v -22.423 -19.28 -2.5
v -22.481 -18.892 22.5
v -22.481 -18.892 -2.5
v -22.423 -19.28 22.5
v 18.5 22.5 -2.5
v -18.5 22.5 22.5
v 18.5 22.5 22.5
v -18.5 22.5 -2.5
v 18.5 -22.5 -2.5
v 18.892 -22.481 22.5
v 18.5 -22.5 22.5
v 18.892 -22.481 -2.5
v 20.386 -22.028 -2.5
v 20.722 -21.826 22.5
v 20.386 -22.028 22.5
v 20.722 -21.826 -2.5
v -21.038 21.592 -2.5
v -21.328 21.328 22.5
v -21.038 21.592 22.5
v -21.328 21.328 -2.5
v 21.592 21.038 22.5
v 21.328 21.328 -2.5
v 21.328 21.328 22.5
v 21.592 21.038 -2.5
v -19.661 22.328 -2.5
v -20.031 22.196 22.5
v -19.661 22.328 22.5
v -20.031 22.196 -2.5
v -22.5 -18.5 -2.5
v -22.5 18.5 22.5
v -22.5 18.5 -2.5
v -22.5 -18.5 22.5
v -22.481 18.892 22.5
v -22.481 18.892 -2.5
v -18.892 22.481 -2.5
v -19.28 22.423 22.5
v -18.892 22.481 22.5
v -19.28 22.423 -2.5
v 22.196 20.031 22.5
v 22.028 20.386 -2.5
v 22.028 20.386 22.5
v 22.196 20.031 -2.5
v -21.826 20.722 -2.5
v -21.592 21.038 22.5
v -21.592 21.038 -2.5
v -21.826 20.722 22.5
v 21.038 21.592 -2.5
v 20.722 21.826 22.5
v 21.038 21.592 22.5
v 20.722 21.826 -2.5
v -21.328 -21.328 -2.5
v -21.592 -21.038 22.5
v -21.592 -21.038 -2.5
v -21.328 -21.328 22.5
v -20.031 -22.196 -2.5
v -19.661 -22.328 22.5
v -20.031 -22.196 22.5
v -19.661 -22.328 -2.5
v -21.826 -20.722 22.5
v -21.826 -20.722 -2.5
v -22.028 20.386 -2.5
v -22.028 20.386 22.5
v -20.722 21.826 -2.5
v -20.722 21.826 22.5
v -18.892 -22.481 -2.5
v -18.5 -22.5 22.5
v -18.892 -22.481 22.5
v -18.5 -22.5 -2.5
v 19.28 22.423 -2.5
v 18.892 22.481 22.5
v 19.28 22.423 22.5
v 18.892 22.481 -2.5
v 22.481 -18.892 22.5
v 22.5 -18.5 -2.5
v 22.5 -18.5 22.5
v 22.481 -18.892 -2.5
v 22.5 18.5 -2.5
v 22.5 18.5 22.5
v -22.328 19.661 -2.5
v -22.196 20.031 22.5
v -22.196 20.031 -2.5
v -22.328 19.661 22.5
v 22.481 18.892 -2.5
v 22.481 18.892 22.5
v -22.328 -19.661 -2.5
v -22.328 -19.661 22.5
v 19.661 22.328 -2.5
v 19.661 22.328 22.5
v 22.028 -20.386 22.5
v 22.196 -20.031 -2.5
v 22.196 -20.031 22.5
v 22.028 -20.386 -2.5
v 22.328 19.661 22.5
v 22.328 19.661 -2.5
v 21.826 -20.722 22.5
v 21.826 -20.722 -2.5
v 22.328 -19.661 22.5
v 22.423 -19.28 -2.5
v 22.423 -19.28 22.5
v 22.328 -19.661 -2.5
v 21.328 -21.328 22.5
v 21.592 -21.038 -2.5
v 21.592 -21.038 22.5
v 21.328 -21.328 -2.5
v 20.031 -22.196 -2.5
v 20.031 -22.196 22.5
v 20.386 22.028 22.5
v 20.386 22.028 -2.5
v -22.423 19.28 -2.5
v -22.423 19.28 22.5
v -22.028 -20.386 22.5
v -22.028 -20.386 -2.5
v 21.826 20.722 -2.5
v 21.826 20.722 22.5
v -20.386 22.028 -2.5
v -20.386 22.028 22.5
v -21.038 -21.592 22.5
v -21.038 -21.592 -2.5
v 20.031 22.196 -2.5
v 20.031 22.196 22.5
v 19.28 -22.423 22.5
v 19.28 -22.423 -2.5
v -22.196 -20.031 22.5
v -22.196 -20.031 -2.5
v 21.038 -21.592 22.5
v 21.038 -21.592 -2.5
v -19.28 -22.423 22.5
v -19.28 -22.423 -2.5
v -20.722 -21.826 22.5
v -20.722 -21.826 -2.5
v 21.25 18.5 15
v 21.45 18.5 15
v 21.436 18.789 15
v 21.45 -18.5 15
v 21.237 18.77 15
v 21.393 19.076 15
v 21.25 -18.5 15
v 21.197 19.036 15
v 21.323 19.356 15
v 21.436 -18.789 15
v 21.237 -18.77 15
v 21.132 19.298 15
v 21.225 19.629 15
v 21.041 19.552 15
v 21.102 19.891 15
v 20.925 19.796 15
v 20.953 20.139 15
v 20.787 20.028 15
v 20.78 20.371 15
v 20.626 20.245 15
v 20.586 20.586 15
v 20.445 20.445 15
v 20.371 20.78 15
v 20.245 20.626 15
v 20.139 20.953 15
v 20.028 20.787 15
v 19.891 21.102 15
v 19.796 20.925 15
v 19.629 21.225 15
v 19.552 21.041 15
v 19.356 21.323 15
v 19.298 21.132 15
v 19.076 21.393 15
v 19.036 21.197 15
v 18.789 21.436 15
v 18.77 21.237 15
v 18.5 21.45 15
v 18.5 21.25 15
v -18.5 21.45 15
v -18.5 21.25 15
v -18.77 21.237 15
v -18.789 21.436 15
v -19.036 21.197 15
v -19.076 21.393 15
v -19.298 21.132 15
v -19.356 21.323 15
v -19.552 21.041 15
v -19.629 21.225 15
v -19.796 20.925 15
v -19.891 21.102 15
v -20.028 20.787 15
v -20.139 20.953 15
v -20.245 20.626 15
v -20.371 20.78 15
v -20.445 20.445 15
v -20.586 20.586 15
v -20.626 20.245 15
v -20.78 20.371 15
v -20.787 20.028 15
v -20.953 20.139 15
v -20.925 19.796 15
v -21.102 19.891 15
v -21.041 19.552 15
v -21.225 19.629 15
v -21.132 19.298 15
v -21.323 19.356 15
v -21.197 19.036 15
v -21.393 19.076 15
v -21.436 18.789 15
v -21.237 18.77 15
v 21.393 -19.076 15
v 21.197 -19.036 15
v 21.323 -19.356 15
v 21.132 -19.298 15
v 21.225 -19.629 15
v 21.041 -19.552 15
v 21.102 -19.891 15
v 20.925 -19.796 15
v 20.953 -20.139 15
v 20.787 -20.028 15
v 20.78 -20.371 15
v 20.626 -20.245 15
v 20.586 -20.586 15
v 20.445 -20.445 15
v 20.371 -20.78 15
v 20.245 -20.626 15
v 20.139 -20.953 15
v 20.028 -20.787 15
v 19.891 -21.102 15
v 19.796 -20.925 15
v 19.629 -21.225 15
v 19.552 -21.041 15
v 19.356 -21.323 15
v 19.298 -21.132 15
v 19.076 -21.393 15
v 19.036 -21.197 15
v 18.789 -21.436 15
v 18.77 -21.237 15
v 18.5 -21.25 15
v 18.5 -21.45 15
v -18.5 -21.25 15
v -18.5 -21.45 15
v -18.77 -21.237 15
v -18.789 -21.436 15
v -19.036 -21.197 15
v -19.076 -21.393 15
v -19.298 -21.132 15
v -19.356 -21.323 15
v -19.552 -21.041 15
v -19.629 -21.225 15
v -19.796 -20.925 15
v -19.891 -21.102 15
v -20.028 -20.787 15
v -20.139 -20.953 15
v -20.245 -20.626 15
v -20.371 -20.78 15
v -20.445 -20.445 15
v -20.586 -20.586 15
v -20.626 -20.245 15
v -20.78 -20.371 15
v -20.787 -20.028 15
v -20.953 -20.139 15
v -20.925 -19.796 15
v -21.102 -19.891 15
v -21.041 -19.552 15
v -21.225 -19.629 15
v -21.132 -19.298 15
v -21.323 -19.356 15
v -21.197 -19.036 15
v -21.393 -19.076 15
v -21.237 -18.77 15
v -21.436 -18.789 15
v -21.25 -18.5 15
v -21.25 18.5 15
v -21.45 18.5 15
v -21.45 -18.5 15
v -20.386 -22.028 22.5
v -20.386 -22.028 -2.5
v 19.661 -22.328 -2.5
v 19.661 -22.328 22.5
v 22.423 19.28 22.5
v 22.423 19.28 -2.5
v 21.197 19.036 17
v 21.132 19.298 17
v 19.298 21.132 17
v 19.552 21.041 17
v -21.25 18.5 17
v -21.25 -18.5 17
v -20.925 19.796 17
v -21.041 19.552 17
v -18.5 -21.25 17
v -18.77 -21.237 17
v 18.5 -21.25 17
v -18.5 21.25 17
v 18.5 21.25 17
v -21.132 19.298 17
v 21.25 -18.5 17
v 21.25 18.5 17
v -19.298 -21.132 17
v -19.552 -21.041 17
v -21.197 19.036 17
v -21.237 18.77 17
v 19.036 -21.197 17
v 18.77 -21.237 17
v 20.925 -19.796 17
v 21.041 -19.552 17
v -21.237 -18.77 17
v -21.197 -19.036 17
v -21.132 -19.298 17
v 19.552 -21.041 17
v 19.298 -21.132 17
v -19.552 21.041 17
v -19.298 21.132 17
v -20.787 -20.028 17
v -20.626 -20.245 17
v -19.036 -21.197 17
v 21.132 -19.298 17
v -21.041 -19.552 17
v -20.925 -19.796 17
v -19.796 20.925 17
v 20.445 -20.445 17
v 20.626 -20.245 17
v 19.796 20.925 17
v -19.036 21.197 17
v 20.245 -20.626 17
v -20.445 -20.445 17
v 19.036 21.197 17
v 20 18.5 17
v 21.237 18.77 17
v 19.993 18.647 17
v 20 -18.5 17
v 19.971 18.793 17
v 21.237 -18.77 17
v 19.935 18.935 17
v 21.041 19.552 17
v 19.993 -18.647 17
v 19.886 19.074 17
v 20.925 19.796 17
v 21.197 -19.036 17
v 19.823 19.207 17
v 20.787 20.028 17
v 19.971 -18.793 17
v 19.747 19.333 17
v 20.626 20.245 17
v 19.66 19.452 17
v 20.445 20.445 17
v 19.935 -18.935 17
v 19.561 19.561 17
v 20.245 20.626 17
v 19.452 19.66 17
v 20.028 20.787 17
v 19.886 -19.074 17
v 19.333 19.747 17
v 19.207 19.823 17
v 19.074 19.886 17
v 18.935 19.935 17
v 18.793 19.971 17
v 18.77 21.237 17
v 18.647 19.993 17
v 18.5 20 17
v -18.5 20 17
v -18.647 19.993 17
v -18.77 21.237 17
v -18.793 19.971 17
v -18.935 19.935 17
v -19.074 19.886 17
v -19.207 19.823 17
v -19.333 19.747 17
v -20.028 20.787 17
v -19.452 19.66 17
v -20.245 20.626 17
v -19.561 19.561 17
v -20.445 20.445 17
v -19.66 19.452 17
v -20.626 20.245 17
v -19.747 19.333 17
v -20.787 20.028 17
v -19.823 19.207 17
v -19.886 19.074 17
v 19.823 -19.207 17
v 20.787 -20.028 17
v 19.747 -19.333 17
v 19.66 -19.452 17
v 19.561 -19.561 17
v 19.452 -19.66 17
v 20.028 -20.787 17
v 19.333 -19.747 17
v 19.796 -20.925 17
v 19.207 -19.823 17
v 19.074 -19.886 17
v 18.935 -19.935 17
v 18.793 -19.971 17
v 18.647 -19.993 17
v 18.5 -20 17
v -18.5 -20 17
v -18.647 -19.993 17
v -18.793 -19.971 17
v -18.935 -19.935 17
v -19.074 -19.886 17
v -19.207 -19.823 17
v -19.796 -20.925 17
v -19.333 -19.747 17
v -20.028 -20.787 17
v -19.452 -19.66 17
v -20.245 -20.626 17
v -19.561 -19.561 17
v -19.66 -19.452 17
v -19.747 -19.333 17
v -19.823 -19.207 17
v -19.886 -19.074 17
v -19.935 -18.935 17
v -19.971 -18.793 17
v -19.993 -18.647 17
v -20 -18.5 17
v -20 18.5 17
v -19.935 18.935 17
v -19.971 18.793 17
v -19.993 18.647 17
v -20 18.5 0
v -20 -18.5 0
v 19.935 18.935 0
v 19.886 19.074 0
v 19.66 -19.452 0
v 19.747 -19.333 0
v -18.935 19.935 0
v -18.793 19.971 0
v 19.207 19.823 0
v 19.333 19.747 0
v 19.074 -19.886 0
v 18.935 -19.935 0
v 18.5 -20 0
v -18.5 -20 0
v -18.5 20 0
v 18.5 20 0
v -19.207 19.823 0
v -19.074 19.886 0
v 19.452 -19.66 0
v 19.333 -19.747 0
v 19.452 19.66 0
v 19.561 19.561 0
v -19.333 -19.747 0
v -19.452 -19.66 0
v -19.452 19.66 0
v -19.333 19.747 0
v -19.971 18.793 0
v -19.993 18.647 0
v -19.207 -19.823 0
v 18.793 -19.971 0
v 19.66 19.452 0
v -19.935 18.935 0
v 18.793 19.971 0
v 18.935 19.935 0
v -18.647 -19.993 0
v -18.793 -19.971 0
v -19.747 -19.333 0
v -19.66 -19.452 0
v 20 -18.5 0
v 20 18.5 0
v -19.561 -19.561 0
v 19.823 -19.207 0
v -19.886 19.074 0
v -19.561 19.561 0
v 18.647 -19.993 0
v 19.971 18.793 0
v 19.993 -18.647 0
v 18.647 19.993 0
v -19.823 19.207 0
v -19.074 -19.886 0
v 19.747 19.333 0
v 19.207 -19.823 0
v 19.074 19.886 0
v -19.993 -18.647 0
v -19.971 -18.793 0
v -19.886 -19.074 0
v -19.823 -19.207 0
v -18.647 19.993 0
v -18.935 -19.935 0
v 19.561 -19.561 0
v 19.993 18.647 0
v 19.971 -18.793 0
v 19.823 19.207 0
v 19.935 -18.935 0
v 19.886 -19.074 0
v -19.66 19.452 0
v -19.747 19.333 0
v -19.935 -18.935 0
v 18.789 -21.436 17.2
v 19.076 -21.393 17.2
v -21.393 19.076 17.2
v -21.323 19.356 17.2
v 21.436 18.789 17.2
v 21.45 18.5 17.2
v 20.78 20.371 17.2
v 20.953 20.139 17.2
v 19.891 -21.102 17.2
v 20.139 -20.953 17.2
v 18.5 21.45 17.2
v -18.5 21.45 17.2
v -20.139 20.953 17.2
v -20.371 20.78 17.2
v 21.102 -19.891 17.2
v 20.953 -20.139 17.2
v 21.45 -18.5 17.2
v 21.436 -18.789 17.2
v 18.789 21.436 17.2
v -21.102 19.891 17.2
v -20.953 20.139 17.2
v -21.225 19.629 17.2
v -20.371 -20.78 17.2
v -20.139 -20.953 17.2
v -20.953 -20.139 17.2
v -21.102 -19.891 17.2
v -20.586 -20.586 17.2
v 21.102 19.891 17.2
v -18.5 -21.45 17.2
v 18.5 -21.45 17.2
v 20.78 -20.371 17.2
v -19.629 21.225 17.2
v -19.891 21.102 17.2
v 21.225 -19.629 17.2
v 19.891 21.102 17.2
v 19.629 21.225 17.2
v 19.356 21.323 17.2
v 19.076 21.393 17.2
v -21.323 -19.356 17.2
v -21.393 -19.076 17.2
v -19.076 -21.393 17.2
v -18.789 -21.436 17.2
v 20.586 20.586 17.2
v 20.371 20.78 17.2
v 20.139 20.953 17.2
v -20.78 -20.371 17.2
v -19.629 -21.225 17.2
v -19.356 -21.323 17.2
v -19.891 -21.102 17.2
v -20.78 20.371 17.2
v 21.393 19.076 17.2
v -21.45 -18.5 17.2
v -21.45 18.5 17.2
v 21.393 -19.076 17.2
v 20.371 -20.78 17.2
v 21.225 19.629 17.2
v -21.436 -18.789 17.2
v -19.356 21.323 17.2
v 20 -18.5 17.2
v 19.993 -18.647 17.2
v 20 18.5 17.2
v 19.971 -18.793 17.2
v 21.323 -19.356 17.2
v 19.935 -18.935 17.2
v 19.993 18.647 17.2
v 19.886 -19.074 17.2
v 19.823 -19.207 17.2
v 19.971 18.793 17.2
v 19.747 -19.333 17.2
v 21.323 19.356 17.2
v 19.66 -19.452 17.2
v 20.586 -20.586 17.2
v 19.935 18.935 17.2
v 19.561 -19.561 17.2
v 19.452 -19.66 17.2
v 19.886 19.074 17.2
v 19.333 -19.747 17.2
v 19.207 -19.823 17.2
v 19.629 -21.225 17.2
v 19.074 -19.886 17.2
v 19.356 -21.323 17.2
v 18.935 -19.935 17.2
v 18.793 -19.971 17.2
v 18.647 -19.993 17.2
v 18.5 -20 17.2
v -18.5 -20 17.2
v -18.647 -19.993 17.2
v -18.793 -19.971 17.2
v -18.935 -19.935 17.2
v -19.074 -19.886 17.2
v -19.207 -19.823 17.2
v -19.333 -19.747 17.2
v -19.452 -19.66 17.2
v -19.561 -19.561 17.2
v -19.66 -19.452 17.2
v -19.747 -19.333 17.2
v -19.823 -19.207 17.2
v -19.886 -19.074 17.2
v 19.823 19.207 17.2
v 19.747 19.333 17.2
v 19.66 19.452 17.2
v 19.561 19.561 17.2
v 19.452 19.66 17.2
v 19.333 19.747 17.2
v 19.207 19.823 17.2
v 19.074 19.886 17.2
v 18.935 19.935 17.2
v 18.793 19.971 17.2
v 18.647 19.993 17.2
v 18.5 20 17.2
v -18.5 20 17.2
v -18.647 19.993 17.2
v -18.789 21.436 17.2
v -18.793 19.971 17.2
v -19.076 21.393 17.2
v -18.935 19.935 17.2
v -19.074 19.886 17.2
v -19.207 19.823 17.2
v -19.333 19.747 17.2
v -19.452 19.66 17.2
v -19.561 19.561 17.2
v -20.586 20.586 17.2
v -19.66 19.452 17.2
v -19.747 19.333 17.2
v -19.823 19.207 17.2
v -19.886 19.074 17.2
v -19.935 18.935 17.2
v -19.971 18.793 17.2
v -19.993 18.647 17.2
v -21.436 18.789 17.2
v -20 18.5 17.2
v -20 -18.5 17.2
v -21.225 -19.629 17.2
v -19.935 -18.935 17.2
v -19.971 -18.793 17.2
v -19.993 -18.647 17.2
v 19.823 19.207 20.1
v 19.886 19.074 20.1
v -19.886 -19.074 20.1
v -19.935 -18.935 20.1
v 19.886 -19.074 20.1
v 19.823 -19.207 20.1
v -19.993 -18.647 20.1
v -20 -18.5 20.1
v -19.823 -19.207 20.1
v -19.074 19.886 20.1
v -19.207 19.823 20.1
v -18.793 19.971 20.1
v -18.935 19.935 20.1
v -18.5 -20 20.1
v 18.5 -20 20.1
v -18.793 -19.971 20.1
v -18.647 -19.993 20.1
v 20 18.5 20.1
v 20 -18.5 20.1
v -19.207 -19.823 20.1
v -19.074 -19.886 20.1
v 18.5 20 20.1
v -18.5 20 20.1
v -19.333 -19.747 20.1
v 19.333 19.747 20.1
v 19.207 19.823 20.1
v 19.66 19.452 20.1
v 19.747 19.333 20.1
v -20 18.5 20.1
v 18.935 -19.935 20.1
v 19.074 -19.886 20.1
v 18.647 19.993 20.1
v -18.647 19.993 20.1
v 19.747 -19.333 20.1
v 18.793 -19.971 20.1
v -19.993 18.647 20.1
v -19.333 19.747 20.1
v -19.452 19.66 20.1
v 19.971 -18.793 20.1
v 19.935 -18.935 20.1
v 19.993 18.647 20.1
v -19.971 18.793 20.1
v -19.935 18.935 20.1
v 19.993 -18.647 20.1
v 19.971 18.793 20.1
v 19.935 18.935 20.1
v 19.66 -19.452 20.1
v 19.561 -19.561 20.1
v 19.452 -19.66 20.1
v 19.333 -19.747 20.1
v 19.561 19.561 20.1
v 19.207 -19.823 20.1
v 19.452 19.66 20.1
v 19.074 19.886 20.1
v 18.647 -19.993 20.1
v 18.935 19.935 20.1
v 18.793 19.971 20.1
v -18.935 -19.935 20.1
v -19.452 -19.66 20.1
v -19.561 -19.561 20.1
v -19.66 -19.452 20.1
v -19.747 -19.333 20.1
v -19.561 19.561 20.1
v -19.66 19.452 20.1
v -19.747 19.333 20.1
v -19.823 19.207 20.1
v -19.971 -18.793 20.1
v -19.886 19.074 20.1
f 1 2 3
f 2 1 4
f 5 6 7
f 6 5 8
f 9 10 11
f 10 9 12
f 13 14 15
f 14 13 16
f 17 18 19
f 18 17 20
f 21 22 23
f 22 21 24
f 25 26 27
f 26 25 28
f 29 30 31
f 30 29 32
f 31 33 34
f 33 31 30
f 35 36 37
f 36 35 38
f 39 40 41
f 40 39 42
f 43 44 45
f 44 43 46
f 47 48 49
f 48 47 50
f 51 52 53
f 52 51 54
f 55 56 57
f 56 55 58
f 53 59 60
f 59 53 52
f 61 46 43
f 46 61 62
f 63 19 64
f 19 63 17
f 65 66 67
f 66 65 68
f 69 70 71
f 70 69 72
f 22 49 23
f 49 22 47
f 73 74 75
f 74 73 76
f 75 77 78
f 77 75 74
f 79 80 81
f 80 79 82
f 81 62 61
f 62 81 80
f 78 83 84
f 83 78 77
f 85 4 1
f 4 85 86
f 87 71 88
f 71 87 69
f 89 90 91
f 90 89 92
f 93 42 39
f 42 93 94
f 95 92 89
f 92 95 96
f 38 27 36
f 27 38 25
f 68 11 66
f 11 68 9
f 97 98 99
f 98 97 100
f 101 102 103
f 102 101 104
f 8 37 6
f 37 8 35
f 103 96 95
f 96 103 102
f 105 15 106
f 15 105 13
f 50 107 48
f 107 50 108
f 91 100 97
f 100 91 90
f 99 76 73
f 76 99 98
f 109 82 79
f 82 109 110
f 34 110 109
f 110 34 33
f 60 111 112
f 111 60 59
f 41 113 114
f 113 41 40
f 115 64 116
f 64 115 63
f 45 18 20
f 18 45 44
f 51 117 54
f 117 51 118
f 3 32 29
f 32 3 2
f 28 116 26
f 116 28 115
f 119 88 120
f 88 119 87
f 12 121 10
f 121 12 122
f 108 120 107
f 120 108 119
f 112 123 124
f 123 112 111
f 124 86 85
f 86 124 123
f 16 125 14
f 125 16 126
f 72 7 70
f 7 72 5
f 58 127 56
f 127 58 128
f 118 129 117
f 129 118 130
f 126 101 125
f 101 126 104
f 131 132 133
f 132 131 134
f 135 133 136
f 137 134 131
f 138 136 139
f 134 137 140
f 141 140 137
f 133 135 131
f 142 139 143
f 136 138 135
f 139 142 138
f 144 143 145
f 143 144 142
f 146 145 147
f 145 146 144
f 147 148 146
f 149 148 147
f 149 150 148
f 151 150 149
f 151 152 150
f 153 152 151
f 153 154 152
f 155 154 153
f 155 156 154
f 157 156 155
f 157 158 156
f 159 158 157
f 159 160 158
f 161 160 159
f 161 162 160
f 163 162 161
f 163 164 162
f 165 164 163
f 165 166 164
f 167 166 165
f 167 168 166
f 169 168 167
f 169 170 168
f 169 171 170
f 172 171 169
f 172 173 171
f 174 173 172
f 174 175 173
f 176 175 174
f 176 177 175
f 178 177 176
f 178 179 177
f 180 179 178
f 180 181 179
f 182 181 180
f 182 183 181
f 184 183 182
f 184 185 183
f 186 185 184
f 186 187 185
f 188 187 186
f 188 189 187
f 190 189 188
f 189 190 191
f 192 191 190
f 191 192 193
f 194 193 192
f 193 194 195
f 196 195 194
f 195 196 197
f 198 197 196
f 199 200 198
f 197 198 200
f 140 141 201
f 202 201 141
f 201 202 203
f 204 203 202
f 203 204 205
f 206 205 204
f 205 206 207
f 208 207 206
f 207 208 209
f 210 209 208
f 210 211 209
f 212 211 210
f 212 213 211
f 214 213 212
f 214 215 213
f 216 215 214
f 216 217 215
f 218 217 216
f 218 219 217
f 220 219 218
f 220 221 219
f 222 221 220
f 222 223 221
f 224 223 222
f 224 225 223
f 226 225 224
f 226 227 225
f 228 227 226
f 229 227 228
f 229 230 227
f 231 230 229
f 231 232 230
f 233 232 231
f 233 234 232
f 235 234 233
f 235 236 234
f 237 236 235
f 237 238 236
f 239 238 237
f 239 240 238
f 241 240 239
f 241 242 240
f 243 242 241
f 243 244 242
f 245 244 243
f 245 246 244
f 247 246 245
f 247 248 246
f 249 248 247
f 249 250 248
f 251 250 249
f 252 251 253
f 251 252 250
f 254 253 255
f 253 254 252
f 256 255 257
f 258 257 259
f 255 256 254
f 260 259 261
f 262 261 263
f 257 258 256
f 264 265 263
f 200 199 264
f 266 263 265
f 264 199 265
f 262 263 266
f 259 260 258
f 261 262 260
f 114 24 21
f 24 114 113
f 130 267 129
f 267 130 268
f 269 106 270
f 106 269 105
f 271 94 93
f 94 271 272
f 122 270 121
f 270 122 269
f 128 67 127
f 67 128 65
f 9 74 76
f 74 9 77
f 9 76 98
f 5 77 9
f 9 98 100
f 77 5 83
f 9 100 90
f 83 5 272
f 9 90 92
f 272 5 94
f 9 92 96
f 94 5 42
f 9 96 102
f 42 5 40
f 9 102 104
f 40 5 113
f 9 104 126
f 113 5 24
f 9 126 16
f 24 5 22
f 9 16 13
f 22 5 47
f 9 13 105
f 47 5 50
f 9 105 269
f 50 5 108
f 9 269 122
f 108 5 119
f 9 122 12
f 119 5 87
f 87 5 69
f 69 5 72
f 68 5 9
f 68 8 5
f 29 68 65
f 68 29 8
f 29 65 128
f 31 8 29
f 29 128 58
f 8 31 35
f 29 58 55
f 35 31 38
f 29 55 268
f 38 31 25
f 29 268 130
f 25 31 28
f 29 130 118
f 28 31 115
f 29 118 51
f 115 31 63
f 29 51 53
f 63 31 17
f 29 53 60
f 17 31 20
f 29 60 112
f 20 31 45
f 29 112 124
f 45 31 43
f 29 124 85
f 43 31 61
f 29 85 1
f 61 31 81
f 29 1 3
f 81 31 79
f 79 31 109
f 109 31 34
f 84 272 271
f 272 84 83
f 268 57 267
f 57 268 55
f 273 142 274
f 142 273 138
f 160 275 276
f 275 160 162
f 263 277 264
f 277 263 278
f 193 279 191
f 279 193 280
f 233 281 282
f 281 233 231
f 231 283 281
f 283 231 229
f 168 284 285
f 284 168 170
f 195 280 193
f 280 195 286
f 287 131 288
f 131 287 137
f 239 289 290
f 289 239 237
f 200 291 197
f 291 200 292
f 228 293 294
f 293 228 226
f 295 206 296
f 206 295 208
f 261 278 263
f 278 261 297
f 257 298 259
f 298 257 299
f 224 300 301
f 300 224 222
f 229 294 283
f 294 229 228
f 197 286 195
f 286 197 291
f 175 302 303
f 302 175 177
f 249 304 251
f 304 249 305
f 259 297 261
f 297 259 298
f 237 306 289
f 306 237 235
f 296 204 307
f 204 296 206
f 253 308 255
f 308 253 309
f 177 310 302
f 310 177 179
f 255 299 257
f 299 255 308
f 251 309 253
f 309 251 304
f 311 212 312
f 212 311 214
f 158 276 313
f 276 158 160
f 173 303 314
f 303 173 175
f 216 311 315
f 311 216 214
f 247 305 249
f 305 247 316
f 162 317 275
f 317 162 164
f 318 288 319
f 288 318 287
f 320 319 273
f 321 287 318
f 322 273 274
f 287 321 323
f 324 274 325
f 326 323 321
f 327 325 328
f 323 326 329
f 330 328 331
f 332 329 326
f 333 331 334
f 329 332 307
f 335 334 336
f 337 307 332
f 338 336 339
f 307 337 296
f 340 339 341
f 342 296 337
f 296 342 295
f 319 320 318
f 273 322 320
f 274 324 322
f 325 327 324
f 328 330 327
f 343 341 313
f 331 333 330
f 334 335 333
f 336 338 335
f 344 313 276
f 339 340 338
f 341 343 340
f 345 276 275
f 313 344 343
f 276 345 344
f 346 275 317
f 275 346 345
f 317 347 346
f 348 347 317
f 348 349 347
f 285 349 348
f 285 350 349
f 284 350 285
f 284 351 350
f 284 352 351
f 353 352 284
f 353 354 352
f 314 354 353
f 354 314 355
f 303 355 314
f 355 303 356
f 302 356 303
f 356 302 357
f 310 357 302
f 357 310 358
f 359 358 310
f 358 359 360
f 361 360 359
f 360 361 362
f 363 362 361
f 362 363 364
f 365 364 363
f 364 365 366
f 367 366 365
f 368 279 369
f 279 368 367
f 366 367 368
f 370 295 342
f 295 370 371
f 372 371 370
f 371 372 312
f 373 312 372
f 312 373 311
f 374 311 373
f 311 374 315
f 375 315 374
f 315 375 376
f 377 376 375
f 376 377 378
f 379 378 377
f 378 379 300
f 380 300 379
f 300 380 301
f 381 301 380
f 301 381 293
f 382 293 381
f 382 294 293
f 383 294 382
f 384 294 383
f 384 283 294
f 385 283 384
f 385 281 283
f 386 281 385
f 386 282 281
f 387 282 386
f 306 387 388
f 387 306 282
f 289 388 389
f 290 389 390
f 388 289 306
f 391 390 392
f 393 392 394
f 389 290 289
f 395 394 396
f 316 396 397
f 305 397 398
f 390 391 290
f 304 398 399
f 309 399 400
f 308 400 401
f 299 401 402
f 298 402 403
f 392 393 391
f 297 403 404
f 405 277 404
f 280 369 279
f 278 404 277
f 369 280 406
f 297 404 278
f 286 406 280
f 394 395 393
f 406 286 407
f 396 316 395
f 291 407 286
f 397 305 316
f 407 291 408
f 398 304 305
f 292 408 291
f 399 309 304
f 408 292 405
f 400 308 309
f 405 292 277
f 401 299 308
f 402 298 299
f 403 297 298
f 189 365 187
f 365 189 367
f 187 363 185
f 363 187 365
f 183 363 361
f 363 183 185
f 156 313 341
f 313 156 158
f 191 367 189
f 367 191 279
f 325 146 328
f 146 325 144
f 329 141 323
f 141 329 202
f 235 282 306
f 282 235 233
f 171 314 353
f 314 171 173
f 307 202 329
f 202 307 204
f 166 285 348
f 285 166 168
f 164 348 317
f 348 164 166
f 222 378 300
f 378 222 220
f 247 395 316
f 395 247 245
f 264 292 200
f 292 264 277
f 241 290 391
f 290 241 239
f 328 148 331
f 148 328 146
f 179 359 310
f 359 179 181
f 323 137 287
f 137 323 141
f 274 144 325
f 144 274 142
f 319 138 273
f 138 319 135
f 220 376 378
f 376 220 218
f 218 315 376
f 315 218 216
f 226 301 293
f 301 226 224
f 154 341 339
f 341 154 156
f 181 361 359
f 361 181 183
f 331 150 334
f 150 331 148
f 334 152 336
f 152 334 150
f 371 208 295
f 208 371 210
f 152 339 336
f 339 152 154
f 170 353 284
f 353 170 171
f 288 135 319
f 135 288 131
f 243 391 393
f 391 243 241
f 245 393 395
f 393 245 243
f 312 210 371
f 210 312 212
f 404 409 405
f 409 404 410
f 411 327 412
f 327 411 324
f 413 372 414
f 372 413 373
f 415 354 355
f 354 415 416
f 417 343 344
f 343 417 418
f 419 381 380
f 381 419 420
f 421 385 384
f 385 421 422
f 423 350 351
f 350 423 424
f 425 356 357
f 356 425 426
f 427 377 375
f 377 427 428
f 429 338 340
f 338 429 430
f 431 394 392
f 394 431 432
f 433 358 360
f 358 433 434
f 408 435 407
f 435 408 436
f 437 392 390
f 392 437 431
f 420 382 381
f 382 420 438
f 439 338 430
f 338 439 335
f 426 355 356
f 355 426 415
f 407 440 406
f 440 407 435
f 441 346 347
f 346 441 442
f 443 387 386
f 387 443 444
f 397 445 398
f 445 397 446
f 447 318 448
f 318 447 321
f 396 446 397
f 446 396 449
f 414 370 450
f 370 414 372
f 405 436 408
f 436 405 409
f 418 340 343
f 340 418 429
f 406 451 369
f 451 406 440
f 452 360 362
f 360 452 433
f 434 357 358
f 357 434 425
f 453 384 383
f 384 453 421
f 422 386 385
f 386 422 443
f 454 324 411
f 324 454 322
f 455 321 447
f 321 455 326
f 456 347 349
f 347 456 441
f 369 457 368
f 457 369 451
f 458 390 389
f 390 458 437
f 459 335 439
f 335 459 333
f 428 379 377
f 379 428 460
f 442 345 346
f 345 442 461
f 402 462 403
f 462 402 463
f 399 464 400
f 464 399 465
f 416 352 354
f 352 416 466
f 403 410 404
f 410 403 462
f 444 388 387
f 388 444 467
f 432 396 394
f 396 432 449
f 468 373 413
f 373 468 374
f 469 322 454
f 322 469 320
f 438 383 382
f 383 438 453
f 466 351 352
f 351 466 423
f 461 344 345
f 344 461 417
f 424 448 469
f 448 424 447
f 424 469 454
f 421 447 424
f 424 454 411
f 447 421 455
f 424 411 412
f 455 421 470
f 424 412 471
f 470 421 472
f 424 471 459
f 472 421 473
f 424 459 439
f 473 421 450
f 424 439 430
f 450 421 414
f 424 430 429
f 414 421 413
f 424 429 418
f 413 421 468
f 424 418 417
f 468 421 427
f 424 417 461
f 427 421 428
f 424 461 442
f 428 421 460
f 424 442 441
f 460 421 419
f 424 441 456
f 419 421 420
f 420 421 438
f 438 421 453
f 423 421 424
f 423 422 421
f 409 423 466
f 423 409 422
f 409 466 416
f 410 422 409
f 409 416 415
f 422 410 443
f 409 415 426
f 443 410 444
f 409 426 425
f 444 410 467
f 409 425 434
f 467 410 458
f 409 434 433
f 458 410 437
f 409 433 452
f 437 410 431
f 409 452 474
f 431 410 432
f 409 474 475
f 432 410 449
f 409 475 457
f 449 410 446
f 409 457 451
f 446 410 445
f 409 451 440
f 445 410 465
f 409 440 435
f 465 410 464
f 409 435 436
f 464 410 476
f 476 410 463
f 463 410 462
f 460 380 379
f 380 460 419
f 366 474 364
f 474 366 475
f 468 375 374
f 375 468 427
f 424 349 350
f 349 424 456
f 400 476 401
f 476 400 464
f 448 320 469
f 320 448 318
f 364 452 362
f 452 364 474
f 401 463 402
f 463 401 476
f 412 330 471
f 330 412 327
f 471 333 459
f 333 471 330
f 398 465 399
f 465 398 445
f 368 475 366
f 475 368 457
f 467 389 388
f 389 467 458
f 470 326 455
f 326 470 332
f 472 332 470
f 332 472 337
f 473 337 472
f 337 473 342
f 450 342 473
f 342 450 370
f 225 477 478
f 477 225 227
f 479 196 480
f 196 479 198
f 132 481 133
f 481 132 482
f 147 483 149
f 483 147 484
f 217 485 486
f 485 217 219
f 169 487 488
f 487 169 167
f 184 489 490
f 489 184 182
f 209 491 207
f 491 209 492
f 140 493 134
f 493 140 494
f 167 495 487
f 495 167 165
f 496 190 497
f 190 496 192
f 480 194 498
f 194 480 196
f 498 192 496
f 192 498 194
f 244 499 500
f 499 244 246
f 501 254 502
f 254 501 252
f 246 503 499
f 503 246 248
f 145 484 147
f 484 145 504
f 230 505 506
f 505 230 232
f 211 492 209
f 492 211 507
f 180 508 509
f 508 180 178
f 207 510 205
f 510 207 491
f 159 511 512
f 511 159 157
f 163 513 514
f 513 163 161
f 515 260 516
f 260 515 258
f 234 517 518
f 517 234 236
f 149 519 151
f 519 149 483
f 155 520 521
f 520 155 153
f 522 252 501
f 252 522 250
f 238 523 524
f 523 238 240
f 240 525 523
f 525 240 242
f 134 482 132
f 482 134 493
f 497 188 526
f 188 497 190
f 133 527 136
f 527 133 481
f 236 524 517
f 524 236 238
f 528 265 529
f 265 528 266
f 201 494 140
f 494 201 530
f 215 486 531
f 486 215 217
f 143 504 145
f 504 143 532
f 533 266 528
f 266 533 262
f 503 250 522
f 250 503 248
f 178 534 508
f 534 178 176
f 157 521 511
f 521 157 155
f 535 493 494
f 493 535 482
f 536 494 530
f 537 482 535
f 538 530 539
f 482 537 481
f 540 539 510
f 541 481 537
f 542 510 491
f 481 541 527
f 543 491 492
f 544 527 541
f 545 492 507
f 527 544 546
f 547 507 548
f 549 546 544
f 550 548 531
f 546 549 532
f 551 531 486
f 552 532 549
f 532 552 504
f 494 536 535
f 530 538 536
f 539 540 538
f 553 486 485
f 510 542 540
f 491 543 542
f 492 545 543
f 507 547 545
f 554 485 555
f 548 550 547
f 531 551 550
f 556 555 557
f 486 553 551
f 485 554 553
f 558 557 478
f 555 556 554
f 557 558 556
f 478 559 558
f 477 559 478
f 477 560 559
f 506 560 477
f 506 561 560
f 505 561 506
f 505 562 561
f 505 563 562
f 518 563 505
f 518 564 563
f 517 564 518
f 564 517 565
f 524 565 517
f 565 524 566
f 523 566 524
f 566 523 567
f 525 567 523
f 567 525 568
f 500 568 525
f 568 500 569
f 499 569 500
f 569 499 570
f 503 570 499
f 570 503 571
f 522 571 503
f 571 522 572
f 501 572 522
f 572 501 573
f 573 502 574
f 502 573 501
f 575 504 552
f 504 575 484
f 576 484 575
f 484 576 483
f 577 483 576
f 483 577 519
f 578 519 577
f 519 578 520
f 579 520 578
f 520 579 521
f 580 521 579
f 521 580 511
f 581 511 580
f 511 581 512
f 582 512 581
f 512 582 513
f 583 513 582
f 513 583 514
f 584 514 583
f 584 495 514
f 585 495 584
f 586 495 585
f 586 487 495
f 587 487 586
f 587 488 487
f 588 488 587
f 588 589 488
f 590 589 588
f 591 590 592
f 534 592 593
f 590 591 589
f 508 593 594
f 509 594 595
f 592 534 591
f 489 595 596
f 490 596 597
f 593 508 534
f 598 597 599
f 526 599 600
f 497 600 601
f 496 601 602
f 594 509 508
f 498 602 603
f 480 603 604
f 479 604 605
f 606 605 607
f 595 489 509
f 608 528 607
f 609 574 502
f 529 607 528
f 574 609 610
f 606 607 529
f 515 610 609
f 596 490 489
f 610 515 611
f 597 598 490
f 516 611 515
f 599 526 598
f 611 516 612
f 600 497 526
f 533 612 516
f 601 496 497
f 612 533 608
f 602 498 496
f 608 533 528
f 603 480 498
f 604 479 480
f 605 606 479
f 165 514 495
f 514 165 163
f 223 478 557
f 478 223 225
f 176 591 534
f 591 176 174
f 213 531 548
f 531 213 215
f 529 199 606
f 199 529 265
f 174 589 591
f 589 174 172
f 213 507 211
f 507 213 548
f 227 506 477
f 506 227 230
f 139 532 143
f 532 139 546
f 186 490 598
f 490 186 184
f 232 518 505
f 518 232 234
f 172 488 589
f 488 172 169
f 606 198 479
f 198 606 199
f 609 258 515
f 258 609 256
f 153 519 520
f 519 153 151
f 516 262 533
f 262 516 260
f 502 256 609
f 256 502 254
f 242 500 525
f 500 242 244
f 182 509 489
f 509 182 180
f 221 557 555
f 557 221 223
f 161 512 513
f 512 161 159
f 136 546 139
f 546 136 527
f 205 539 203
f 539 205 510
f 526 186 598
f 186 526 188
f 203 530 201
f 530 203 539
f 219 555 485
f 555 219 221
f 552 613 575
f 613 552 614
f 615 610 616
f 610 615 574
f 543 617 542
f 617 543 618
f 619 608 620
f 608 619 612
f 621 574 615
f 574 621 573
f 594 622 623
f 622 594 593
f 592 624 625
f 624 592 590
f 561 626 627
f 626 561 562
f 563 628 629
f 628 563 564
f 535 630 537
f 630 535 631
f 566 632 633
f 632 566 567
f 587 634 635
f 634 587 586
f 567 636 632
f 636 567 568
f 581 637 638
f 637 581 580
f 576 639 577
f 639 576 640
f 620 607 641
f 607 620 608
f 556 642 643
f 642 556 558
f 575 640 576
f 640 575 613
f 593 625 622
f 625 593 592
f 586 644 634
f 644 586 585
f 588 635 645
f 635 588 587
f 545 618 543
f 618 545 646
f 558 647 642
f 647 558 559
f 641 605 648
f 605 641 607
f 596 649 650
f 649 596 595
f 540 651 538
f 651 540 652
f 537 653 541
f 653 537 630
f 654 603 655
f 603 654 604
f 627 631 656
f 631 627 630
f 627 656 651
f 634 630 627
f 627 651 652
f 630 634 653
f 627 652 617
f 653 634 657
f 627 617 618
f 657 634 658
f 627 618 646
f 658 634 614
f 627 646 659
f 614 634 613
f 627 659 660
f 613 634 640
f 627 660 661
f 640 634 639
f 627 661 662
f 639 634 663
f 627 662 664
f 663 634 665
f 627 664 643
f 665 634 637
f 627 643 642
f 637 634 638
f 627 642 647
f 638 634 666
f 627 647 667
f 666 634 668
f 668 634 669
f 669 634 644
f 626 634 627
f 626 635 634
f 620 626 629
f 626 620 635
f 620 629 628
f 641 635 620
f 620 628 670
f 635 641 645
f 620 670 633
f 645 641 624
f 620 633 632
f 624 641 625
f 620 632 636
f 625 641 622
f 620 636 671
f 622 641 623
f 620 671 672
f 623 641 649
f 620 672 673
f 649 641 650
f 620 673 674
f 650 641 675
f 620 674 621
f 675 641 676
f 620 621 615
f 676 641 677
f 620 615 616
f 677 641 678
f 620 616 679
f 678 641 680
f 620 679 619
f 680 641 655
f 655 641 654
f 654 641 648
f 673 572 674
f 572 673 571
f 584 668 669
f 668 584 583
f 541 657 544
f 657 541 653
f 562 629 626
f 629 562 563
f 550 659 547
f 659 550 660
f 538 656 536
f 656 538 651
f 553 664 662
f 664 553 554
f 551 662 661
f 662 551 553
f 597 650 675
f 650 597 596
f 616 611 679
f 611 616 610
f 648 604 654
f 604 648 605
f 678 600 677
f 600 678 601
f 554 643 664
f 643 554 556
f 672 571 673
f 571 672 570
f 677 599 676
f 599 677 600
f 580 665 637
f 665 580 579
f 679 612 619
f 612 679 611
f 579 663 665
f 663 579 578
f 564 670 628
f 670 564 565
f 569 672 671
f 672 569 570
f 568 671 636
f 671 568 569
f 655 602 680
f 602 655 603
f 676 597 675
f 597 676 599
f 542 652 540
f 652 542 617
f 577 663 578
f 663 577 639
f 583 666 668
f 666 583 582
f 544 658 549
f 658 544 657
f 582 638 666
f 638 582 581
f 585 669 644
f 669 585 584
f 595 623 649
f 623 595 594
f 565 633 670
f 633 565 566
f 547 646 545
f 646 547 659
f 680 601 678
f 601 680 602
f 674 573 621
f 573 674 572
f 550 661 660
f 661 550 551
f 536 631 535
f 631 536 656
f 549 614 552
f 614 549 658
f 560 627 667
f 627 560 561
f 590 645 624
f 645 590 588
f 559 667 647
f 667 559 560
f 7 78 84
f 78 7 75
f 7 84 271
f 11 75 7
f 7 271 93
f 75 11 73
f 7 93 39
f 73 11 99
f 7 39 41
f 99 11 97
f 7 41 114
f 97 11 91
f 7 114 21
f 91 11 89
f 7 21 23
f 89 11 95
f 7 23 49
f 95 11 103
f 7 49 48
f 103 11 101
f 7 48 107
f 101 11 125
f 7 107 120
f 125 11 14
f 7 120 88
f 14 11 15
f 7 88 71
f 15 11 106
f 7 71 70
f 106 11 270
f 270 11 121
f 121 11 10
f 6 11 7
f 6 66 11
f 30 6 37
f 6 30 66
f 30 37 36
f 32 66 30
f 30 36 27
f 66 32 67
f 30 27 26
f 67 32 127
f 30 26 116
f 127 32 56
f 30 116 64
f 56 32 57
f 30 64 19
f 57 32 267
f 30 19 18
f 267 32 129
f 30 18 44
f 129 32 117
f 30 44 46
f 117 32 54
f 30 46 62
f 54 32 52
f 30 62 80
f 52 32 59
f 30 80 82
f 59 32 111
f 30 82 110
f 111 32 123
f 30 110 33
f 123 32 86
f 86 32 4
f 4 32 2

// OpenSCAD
// Parameters
cavity_width = 40.0;
cavity_length = 40.0;
cavity_height_base = 15.0;
cavity_height_lid = 5.0;
wall_thickness = 2.5;
lip_height = 2.0;
clearance = 0.2; // 3D printing clearance

// Radii calculations for rounded corners to maintain uniform wall thickness
r_outer = 4.0;
r_inner = r_outer - wall_thickness; // 1.5
lip_width = wall_thickness / 2;     // 1.25
r_lip_outer = r_outer - lip_width;  // 2.75
r_pocket = r_lip_outer + clearance; // 2.95

// Derived dimensions
outer_width = cavity_width + 2 * wall_thickness;
outer_length = cavity_length + 2 * wall_thickness;

module rounded_box(w, l, h, r) {
    translate([-w/2, -l/2, 0]) {
        hull() {
            translate([r, r, 0]) cylinder(r=r, h=h, $fn=64);
            translate([w-r, r, 0]) cylinder(r=r, h=h, $fn=64);
            translate([r, l-r, 0]) cylinder(r=r, h=h, $fn=64);
            translate([w-r, l-r, 0]) cylinder(r=r, h=h, $fn=64);
        }
    }
}

module base() {
    difference() {
        union() {
            // Main body
            translate([0, 0, -wall_thickness])
                rounded_box(outer_width, outer_length, cavity_height_base + wall_thickness, r_outer);
            
            // Mating lip
            translate([0, 0, cavity_height_base])
                rounded_box(
                    cavity_width + 2*lip_width,
                    cavity_length + 2*lip_width,
                    lip_height,
                    r_lip_outer
                );
        }
        
        // Inner cavity cutout
        translate([0, 0, 0])
            rounded_box(
                cavity_width,
                cavity_length,
                cavity_height_base + lip_height + 1.0,
                r_inner
            );
    }
}

module lid() {
    difference() {
        // Main lid body
        translate([0, 0, cavity_height_base])
            rounded_box(
                outer_width,
                outer_length,
                cavity_height_lid + wall_thickness,
                r_outer
            );
        
        union() {
            // Pocket for the base lip (with clearance)
            translate([0, 0, cavity_height_base - 0.1])
                rounded_box(
                    cavity_width + 2*(lip_width + clearance),
                    cavity_length + 2*(lip_width + clearance),
                    lip_height + clearance + 0.1,
                    r_pocket
                );
            
            // Lid inner cavity
            translate([0, 0, cavity_height_base + lip_height + clearance])
                rounded_box(
                    cavity_width,
                    cavity_length,
                    cavity_height_lid - (lip_height + clearance) + 0.1,
                    r_inner
                );
        }
    }
}

// Render both parts in their assembled configuration
color("LightBlue") base();
color("LightGreen") lid();
